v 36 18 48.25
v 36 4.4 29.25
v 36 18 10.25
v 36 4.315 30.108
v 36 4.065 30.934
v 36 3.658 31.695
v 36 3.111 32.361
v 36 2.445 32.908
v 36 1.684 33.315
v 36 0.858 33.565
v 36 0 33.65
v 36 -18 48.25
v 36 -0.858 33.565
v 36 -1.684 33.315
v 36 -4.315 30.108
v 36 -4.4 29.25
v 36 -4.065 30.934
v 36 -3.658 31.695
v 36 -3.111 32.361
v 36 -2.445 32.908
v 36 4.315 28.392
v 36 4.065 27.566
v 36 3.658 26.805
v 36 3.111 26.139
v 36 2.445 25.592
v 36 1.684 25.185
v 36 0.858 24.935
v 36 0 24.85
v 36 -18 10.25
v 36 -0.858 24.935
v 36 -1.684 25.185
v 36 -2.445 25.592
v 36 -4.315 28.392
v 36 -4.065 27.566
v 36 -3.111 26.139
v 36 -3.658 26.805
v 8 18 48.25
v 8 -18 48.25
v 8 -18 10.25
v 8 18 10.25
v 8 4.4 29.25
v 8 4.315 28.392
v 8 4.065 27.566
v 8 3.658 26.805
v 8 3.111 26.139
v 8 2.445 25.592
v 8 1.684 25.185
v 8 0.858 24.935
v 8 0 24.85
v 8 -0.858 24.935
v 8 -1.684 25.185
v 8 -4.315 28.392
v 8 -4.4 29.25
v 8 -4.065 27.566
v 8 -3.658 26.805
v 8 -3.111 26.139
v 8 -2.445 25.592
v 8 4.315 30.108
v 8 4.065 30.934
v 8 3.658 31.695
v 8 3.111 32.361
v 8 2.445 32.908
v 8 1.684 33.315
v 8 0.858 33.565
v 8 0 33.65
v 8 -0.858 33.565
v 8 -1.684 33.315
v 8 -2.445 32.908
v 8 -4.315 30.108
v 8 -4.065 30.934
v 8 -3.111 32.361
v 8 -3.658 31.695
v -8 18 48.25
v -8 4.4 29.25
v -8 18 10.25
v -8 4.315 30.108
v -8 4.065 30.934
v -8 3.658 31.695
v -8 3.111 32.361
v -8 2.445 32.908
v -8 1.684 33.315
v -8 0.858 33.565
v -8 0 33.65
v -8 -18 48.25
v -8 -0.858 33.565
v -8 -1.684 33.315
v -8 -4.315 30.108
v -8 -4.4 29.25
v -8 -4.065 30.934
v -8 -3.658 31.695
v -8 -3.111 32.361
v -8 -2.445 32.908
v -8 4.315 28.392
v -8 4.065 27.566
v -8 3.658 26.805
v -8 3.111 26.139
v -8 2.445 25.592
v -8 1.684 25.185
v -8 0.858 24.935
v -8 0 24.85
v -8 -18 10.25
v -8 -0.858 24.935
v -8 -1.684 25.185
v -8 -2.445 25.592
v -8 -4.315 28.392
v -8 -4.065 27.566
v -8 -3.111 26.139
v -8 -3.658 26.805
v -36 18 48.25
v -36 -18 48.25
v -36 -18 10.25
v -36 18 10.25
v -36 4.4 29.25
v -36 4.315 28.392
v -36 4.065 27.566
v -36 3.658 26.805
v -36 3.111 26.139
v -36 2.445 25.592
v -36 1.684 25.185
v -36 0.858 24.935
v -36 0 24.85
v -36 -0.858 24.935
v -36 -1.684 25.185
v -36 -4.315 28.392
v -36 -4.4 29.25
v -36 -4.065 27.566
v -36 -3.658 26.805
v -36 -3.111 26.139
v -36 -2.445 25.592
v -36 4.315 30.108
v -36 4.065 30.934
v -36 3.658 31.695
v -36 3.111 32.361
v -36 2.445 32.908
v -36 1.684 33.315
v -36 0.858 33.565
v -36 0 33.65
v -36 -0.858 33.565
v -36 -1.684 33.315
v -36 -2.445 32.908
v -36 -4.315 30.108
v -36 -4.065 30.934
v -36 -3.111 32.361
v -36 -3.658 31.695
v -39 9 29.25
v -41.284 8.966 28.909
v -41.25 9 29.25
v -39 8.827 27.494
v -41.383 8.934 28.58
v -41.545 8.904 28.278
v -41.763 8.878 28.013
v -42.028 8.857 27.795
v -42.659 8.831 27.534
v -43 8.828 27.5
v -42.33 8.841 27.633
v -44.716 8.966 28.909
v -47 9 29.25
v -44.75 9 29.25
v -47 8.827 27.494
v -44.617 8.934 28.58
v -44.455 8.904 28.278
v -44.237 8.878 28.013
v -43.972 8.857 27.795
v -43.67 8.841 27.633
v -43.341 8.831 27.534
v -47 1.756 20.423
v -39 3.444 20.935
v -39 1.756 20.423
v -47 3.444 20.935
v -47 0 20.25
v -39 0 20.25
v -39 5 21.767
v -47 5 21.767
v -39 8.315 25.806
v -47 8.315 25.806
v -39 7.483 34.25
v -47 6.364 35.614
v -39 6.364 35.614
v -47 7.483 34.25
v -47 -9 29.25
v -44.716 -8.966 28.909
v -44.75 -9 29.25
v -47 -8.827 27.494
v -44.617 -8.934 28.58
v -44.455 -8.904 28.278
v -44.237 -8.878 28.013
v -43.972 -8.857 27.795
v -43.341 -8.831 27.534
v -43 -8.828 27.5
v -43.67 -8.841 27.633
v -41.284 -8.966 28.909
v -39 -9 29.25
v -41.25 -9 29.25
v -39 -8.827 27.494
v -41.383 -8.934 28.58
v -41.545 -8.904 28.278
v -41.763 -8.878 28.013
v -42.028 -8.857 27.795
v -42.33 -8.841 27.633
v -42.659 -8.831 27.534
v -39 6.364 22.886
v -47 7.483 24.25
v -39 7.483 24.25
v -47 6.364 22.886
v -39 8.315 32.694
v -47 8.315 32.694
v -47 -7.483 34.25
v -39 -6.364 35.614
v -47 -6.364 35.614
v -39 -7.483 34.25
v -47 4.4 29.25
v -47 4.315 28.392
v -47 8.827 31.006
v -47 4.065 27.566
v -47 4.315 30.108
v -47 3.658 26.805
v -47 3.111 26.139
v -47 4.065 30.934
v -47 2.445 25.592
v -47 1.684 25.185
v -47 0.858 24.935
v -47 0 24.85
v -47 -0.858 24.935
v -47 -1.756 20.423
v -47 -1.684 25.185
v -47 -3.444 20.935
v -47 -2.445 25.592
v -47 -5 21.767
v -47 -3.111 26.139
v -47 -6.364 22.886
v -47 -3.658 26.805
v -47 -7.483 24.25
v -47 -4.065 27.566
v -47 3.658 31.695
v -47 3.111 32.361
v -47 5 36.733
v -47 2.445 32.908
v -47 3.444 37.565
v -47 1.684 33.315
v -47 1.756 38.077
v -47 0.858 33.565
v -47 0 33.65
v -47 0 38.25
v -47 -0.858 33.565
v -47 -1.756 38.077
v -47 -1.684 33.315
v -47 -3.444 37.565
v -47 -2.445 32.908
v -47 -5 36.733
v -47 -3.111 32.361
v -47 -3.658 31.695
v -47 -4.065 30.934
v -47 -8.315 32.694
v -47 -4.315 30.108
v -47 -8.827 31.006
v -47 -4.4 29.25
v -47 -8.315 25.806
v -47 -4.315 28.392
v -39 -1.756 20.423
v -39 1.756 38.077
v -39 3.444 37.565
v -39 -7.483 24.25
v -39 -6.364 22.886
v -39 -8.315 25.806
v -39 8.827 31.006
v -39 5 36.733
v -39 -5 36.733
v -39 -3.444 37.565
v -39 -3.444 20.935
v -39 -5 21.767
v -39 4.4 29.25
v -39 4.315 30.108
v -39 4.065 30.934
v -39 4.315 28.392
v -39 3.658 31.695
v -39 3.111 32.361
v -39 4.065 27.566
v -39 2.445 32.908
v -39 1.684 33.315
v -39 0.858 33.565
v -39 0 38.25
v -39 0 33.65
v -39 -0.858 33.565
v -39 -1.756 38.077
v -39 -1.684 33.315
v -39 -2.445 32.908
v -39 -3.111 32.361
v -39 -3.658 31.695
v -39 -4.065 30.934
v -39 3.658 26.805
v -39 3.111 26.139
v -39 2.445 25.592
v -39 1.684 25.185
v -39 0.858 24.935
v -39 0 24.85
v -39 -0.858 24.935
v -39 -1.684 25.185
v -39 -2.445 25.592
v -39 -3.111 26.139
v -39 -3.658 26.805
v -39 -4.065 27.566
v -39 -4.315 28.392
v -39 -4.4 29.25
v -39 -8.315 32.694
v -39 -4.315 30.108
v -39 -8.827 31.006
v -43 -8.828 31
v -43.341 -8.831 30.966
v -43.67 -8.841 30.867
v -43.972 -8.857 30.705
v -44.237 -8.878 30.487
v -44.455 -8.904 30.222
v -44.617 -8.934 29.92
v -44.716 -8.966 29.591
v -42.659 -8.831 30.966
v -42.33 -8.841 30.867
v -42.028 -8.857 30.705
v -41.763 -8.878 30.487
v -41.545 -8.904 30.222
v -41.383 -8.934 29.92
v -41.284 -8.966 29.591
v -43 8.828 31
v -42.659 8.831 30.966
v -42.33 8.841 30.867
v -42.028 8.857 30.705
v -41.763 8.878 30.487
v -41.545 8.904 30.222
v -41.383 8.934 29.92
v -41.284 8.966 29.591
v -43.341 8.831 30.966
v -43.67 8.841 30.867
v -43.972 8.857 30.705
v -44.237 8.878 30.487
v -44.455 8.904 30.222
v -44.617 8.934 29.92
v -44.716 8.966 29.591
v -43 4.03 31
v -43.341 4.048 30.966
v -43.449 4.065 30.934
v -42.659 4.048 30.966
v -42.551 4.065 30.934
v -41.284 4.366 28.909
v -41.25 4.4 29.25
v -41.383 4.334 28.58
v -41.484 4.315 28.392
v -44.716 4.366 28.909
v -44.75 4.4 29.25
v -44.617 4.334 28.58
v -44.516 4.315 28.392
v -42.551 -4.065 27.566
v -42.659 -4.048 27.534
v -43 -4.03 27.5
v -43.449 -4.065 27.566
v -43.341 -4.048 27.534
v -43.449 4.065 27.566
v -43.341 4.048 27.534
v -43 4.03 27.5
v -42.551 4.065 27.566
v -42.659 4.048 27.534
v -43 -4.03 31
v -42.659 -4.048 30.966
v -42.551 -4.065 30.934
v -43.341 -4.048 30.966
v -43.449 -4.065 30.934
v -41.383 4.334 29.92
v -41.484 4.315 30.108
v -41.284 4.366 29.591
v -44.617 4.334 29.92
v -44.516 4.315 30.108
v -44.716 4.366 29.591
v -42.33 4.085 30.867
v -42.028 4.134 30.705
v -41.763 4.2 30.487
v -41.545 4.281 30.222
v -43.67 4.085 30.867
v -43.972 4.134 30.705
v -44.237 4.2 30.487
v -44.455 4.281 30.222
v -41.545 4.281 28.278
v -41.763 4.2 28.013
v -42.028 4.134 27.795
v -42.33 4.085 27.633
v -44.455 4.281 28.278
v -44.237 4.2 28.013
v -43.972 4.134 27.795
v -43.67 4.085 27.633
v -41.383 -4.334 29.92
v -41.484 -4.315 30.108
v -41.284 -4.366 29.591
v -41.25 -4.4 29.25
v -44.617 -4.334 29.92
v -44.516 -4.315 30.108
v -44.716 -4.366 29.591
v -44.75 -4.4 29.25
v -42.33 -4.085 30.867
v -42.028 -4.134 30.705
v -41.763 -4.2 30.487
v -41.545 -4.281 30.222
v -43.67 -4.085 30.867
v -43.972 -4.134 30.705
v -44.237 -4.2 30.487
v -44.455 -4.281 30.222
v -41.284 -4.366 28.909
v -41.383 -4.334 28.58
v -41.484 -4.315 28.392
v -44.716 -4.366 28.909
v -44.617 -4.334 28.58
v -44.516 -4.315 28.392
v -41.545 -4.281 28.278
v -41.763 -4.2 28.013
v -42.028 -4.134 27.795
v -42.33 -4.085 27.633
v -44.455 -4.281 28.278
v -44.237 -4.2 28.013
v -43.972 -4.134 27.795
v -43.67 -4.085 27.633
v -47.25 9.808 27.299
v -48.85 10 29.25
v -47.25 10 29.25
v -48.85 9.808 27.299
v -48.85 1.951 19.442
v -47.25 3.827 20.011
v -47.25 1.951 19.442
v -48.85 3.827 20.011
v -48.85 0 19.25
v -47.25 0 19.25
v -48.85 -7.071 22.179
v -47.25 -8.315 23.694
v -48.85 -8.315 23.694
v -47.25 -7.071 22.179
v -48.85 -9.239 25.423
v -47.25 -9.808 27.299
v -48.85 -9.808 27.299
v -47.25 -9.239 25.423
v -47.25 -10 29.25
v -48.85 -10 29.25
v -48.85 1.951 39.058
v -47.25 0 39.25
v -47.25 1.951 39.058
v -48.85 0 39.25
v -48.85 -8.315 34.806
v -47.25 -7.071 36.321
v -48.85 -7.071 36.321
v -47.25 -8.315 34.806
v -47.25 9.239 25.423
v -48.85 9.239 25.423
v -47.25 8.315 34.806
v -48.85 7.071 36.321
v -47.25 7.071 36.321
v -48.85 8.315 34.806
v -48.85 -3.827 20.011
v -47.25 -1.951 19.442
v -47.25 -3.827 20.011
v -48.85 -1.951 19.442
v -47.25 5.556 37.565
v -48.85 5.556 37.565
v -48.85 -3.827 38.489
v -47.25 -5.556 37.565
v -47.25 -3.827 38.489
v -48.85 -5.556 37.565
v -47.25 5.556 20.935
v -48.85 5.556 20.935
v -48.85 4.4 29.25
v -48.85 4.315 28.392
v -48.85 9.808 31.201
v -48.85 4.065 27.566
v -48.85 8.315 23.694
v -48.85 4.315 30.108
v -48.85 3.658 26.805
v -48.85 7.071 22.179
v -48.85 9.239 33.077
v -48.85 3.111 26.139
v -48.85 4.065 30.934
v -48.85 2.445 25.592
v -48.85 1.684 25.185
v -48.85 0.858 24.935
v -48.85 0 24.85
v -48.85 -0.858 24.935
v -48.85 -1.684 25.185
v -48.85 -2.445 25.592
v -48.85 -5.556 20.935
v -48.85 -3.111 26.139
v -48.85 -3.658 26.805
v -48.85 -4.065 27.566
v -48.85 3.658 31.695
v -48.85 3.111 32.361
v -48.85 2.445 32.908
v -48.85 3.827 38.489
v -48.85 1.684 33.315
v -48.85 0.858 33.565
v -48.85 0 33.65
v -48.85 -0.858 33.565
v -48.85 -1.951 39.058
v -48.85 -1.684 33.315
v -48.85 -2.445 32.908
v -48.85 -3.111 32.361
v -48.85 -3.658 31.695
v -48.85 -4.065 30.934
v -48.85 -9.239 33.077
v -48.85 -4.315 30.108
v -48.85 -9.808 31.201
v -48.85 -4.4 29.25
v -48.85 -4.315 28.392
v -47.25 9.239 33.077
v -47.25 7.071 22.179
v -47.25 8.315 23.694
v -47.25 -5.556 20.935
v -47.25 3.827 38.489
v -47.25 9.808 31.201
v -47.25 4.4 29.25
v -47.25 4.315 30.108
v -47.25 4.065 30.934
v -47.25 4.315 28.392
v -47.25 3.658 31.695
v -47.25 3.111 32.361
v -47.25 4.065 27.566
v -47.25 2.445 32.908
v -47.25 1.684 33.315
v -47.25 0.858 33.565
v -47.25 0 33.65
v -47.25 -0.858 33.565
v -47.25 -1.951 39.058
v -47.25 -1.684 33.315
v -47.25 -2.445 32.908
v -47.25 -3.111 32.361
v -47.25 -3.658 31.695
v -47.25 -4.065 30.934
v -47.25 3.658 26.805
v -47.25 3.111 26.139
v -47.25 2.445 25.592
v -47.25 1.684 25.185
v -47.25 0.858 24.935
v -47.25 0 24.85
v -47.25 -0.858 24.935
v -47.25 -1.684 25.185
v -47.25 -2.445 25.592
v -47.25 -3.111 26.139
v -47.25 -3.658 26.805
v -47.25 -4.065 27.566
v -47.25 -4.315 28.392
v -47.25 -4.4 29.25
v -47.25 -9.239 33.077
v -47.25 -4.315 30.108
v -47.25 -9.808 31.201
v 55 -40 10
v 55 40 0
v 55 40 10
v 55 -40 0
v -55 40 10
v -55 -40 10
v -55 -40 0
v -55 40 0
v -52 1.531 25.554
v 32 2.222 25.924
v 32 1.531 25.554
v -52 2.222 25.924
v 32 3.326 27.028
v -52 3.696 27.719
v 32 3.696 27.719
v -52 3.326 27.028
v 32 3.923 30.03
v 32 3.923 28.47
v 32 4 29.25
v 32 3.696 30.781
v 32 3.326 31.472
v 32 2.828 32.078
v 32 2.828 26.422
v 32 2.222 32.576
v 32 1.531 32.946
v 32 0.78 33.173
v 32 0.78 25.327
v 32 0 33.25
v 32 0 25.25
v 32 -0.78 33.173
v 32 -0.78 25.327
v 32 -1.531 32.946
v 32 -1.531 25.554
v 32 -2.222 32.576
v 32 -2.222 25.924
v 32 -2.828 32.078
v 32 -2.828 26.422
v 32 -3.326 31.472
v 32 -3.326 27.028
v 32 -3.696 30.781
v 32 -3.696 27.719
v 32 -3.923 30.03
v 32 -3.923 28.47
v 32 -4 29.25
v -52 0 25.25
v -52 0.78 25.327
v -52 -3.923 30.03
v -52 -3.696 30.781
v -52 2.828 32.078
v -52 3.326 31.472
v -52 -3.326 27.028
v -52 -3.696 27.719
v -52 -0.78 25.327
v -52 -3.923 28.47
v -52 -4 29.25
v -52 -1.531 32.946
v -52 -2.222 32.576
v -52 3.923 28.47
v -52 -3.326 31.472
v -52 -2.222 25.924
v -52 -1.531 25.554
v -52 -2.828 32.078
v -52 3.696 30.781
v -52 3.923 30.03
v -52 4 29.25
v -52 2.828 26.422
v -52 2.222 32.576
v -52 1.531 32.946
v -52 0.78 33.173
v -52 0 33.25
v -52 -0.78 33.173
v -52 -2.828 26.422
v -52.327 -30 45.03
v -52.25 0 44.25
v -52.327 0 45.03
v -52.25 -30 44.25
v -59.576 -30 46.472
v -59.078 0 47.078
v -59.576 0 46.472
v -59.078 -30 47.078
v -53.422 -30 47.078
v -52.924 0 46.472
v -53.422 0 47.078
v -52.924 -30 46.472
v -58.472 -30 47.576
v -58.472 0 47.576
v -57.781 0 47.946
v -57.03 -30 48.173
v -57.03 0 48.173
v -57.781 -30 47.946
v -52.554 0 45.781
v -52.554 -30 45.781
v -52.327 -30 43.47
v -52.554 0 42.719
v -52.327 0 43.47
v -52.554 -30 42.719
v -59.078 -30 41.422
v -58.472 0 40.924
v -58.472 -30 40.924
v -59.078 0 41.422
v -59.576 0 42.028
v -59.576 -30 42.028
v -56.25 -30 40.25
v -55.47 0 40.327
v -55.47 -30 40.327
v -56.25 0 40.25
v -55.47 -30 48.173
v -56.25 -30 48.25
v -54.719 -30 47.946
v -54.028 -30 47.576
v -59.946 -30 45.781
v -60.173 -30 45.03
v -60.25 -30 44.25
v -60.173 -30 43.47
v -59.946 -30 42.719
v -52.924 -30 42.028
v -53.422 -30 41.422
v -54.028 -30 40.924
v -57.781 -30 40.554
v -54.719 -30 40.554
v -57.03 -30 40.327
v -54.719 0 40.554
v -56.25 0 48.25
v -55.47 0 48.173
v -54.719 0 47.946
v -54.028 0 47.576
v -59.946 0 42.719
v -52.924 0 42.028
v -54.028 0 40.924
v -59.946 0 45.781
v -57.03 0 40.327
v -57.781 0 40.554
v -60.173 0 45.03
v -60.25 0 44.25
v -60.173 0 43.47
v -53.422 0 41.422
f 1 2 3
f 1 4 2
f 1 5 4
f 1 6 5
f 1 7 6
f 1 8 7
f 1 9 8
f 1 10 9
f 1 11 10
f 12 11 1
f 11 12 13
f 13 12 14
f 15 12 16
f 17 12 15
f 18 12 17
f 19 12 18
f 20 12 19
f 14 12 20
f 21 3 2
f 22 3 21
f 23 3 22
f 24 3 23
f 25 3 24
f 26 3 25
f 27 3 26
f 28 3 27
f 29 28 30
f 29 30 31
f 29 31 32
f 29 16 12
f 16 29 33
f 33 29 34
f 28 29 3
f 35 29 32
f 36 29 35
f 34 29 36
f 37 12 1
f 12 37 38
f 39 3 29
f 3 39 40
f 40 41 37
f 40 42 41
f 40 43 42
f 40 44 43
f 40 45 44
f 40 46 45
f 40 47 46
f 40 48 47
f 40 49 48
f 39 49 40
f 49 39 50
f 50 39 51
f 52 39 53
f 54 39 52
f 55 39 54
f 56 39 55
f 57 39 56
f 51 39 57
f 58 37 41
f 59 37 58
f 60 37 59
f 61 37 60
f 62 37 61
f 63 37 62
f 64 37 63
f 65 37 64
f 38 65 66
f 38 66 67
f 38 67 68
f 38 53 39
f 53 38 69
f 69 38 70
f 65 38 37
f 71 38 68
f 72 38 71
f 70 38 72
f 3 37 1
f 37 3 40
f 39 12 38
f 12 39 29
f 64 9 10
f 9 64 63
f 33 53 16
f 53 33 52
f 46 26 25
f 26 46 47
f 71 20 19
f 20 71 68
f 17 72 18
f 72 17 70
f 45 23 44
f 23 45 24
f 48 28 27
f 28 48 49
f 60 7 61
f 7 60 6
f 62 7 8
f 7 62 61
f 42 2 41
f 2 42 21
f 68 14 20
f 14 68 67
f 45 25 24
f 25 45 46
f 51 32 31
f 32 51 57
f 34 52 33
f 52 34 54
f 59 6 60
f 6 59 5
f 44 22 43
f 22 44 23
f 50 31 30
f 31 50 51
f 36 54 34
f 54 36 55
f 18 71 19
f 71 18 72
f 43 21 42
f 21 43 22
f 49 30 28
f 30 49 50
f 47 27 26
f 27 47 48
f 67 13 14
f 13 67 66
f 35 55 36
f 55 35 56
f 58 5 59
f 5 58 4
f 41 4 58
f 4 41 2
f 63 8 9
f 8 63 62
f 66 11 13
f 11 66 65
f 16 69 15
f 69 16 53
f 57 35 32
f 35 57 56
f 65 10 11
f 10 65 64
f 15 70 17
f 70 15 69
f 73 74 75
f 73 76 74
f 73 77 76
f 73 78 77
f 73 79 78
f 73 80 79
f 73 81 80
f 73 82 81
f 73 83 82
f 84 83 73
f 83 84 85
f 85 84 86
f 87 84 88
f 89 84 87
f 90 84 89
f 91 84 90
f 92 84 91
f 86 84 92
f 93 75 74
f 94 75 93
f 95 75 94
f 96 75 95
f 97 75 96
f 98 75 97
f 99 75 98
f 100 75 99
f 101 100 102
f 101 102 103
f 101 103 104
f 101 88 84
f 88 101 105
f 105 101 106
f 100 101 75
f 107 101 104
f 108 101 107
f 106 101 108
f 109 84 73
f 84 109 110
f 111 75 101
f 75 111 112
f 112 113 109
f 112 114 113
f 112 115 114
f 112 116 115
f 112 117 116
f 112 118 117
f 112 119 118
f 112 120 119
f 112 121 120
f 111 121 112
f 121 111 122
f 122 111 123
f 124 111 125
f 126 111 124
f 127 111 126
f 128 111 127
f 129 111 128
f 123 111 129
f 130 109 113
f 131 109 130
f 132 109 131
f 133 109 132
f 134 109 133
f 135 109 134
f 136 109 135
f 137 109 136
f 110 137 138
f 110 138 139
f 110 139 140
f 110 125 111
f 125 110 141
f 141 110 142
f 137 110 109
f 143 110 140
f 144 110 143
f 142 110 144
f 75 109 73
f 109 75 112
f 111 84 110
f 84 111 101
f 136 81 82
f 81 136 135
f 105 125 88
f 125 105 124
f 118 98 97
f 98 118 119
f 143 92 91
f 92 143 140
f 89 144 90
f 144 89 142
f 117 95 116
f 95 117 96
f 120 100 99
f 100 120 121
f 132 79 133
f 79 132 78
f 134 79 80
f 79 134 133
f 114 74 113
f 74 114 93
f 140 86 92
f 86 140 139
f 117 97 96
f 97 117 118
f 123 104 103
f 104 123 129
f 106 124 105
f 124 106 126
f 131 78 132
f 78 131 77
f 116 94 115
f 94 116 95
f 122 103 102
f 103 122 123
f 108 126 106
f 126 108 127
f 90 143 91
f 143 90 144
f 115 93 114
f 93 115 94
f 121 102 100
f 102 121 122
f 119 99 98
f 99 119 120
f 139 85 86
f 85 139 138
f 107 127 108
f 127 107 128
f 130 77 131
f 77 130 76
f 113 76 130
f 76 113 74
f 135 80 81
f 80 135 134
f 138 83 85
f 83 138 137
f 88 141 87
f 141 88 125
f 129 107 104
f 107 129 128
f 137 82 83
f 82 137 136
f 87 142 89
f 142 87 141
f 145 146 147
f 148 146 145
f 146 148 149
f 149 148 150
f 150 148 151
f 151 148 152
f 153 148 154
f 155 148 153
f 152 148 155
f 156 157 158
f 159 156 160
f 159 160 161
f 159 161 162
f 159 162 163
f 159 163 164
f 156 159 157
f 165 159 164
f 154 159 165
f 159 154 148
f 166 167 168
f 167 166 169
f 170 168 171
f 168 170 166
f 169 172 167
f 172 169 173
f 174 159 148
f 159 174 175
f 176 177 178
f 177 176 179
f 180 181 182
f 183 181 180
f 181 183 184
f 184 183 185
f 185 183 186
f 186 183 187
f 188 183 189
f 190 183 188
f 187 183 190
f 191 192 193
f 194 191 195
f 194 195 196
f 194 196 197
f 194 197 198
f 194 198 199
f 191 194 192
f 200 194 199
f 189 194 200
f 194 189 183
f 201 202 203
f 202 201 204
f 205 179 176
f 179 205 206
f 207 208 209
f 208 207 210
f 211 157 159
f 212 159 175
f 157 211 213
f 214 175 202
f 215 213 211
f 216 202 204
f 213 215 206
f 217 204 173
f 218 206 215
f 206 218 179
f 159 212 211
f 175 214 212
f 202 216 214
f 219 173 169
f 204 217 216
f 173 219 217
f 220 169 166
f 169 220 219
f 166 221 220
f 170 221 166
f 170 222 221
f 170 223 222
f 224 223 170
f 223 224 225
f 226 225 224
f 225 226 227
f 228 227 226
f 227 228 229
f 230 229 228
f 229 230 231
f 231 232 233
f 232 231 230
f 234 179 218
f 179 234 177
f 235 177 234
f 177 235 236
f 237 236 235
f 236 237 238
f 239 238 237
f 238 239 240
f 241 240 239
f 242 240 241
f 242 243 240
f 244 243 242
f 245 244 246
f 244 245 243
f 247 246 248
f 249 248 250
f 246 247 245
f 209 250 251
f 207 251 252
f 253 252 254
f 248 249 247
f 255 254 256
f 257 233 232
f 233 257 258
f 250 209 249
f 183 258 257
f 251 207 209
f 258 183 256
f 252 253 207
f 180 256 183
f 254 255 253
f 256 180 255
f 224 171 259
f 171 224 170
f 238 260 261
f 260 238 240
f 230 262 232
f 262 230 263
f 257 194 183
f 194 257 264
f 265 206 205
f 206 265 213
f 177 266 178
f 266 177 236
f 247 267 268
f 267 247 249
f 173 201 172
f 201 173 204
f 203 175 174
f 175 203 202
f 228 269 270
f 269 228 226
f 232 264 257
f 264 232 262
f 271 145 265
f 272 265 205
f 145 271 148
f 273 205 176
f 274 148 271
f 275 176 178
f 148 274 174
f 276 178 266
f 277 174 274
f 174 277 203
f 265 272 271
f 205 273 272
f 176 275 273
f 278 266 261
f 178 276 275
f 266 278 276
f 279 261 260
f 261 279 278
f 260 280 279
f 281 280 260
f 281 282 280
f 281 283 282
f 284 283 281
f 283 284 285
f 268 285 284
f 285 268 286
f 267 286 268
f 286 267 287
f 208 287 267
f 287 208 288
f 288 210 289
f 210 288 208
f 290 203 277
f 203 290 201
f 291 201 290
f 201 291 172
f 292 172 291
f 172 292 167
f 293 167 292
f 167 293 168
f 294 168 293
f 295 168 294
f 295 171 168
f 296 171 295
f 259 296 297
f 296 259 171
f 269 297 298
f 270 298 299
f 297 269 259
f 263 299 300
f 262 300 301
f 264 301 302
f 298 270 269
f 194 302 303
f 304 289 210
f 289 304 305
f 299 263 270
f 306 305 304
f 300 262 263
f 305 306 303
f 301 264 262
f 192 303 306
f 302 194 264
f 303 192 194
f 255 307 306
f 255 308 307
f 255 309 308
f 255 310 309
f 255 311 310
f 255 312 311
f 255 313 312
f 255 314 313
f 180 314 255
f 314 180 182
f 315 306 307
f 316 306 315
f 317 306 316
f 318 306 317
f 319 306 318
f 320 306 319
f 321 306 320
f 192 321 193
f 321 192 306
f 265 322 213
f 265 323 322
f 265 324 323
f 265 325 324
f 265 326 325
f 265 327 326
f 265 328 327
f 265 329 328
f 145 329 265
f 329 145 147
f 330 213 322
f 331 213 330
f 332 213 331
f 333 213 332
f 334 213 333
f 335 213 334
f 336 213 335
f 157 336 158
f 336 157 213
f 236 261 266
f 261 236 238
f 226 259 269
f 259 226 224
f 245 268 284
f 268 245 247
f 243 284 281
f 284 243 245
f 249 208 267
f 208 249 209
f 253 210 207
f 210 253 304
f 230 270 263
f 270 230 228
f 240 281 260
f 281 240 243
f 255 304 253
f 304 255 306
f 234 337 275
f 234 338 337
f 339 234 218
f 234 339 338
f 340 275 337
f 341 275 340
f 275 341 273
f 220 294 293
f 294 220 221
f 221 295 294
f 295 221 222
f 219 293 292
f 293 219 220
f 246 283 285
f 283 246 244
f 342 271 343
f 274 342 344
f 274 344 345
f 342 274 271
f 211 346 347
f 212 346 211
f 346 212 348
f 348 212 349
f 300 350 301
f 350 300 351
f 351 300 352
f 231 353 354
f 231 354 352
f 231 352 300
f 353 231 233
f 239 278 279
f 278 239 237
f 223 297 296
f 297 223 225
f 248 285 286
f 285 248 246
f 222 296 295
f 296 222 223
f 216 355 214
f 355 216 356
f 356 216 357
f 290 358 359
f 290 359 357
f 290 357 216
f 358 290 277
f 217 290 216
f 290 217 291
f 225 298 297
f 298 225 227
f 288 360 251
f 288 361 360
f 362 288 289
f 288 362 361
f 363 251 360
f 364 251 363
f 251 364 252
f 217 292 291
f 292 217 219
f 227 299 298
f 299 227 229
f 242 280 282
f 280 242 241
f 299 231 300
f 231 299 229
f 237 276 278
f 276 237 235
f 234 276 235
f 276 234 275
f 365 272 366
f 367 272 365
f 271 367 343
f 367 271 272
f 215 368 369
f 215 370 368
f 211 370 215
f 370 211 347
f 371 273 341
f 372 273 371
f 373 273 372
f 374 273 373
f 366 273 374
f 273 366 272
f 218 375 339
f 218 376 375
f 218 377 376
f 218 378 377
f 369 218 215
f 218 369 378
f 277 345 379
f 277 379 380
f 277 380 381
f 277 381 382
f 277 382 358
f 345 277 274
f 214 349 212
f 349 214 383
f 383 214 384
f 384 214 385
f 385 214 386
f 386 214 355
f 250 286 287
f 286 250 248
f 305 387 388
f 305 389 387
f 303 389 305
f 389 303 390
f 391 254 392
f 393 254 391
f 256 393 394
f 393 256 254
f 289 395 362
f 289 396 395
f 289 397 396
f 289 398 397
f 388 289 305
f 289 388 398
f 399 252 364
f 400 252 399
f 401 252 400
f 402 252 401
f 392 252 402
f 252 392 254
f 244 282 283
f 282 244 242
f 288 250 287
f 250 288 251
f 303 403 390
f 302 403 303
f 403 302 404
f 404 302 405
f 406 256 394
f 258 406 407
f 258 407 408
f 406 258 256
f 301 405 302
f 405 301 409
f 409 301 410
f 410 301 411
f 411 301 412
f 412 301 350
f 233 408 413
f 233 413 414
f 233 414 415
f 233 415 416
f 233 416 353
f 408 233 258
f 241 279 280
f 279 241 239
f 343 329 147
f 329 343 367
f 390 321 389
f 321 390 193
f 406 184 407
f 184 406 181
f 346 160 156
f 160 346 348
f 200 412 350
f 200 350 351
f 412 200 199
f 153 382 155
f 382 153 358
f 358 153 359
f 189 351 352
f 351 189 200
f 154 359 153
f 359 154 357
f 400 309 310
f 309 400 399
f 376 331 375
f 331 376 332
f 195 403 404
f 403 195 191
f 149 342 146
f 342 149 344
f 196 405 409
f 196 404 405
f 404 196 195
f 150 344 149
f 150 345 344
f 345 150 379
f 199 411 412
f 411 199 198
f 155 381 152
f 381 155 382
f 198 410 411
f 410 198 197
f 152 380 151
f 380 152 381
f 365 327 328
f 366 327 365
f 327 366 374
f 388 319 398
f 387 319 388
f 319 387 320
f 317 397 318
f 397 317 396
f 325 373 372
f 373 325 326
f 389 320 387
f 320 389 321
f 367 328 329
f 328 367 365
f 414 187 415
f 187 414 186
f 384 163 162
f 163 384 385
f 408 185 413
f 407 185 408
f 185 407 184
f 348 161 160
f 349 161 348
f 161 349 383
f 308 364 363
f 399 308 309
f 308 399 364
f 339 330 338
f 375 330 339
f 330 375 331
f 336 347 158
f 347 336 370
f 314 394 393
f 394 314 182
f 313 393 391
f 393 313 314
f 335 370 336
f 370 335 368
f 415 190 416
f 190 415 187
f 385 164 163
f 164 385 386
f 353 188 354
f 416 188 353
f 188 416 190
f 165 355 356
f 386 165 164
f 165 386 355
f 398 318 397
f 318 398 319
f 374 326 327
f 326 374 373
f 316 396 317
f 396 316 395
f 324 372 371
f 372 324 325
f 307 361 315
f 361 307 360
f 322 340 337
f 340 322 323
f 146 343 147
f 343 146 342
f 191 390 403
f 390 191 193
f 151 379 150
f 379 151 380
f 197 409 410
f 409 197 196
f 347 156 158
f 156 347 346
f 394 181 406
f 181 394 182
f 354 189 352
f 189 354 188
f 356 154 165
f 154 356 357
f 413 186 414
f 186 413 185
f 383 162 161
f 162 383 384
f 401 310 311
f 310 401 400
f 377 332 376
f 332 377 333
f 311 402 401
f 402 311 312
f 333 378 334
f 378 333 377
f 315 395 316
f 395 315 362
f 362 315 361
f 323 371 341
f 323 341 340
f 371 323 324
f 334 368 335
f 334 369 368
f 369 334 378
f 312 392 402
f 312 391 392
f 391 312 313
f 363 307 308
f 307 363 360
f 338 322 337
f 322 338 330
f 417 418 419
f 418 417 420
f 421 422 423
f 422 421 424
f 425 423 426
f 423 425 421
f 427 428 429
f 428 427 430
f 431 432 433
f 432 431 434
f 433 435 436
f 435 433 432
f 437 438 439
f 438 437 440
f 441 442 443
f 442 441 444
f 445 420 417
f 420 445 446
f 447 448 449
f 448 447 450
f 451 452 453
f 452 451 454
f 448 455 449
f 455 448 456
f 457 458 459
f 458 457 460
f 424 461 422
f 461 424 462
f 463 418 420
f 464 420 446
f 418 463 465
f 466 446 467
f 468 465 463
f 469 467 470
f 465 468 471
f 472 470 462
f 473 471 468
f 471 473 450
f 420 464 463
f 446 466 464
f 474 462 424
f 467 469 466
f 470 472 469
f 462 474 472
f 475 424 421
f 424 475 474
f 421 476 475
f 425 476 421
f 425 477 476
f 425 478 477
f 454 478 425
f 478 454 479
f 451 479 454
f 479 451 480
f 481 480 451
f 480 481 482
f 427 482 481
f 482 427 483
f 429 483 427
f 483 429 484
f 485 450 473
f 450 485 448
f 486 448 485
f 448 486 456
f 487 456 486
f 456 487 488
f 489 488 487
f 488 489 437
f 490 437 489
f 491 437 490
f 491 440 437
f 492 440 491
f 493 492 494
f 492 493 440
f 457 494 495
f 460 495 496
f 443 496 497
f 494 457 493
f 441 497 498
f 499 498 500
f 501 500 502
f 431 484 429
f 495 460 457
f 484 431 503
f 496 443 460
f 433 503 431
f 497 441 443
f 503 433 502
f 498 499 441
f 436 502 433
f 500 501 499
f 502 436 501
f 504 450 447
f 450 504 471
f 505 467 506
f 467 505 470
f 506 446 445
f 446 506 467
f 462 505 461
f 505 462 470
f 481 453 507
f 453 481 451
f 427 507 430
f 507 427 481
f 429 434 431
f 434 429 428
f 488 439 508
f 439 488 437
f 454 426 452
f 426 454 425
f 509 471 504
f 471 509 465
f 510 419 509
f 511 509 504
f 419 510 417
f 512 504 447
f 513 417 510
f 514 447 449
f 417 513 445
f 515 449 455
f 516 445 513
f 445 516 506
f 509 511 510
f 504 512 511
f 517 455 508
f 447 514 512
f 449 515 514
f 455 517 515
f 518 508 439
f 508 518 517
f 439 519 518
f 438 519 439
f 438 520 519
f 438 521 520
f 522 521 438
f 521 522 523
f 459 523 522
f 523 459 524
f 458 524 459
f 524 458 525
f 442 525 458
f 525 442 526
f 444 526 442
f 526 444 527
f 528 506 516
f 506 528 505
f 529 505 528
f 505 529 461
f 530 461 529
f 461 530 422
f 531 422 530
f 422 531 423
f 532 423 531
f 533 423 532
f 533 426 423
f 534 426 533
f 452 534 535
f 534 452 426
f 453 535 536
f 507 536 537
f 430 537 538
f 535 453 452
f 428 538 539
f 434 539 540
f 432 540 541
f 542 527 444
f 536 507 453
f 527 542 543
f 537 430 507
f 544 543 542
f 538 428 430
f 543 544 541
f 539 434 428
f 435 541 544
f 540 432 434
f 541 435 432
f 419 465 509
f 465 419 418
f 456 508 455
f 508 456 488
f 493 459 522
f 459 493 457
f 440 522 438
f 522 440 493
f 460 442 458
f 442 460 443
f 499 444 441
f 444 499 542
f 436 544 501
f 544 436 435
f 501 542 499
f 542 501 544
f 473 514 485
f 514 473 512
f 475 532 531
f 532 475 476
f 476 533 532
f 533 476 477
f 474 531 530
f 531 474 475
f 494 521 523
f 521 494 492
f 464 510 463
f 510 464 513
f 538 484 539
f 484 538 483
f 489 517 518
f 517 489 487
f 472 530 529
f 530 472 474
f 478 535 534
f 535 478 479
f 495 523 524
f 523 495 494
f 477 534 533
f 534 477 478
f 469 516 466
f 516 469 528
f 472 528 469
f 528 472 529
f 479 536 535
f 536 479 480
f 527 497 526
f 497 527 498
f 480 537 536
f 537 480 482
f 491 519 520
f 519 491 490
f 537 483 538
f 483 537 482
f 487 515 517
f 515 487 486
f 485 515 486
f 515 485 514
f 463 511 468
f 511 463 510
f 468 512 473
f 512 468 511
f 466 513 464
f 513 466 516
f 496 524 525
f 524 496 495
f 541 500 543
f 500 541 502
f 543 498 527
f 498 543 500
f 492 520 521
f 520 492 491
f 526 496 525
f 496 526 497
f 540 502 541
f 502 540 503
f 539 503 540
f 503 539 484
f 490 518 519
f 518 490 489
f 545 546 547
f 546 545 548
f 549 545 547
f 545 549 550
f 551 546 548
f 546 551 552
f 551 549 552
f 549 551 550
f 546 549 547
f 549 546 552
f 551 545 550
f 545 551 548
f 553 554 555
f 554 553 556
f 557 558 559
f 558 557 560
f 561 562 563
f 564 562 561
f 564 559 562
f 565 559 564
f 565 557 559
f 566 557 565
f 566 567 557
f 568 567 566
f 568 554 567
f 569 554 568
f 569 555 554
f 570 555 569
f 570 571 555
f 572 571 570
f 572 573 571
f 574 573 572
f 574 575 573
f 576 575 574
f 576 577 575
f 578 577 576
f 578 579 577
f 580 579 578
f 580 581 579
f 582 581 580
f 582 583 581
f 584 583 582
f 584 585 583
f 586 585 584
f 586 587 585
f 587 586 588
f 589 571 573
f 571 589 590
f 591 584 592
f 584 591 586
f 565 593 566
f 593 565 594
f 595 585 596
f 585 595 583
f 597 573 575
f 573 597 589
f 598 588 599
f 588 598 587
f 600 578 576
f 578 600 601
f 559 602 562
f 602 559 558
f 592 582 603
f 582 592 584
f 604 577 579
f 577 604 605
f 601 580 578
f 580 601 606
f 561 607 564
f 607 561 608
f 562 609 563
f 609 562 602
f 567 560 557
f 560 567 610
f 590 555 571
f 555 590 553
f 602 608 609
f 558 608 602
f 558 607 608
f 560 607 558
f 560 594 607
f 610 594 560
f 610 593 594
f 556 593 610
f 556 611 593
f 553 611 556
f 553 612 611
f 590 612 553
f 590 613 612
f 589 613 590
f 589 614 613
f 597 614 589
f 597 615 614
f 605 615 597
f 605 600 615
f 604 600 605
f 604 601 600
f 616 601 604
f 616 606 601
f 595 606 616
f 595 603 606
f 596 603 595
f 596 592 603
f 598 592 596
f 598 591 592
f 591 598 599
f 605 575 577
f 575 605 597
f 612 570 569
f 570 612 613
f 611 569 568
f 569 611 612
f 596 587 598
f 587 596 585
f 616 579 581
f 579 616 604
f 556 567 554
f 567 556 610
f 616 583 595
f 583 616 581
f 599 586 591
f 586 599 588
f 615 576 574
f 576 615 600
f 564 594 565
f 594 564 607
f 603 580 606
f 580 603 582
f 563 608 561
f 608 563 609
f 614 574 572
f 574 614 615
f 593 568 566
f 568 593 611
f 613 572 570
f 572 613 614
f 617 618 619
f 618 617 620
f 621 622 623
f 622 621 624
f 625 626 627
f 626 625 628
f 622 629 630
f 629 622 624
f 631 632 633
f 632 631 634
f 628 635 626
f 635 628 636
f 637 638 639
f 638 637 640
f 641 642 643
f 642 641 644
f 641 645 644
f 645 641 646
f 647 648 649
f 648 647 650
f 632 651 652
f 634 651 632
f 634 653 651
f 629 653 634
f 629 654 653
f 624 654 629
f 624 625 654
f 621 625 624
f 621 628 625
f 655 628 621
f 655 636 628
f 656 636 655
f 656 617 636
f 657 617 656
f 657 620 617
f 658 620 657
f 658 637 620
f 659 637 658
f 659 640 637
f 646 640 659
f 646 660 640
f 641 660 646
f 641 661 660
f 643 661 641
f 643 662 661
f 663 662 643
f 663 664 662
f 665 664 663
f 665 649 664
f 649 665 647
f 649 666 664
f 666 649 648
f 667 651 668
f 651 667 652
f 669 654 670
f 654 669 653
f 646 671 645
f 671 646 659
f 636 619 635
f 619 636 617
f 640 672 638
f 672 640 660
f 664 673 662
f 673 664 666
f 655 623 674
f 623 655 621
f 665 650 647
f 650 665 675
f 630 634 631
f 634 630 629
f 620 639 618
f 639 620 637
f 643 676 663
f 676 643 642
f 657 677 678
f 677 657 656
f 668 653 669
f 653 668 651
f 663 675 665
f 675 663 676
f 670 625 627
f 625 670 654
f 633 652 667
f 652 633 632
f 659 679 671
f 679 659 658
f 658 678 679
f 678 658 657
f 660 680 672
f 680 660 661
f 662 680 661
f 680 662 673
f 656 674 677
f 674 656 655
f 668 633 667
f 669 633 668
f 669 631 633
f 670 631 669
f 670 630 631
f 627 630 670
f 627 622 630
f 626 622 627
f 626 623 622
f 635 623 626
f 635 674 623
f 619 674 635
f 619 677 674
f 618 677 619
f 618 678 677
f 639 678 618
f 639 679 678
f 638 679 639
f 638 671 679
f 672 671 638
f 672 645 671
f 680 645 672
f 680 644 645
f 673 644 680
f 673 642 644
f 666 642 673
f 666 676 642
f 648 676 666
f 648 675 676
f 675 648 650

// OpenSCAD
$fn = 32;

// ------------------------------------------------------------------------
// Machine vise: screw d8, jaws 28 x 38 mm
// Every part is its own module, assembly() places every instance.
// ------------------------------------------------------------------------

// --- part 1 ---
module vise_bed() {
  difference() {
    translate([-55, -40, 0]) cube([110, 80, 10]);
  }
}

// --- part 2 ---
module vise_jaw() {
  difference() {
    translate([-14, -18, 0]) cube([28, 36, 38]);
    translate([0, 0, 19]) rotate([0, 90, 0]) cylinder(h = 30, d = 8.8, center = true);
  }
}

// --- part 3 ---
module vise_screw() {
  translate([0, 0, -42]) cylinder(h = 84, d = 8);
}

// --- part 4 ---
module screw_collar() {
  difference() {
    cylinder(h = 8, d = 18);
    translate([0, 0, -1]) cylinder(h = 10, d = 8.8);
    translate([0, 0, 4]) rotate([90, 0, 0]) cylinder(h = 20, d = 3.5, center = true);
  }
}

// --- part 5 ---
module screw_washer() {
  difference() {
      translate([0, 0, 0]) cylinder(h = 1.6, d = 20);
      translate([0, 0, -1]) cylinder(h = 3.6, d = 8.8);
    }
}

// --- part 6 ---
module vise_handle() {
  cylinder(h = 30, d = 8);
}

// --- assembly ---
module assembly() {
  color([0.80, 0.24, 0.20]) translate([0, 0, 0]) rotate([0, 0, 0]) vise_bed();
  color([0.20, 0.45, 0.75]) translate([22, 0, 10.25]) rotate([0, 0, 0]) vise_jaw();
  color([0.25, 0.62, 0.32]) translate([-22, 0, 10.25]) rotate([0, 0, 0]) vise_jaw();
  color([0.92, 0.70, 0.18]) translate([-10, 0, 29.25]) rotate([0, 90, 0]) vise_screw();
  color([0.58, 0.35, 0.70]) translate([-47, 0, 29.25]) rotate([0, 90, 0]) screw_collar();
  color([0.16, 0.66, 0.66]) translate([-48.85, 0, 29.25]) rotate([0, 90, 0]) screw_washer();
  color([0.85, 0.48, 0.18]) translate([-56.25, 0, 44.25]) rotate([90, 0, 0]) vise_handle();
}

assembly();
